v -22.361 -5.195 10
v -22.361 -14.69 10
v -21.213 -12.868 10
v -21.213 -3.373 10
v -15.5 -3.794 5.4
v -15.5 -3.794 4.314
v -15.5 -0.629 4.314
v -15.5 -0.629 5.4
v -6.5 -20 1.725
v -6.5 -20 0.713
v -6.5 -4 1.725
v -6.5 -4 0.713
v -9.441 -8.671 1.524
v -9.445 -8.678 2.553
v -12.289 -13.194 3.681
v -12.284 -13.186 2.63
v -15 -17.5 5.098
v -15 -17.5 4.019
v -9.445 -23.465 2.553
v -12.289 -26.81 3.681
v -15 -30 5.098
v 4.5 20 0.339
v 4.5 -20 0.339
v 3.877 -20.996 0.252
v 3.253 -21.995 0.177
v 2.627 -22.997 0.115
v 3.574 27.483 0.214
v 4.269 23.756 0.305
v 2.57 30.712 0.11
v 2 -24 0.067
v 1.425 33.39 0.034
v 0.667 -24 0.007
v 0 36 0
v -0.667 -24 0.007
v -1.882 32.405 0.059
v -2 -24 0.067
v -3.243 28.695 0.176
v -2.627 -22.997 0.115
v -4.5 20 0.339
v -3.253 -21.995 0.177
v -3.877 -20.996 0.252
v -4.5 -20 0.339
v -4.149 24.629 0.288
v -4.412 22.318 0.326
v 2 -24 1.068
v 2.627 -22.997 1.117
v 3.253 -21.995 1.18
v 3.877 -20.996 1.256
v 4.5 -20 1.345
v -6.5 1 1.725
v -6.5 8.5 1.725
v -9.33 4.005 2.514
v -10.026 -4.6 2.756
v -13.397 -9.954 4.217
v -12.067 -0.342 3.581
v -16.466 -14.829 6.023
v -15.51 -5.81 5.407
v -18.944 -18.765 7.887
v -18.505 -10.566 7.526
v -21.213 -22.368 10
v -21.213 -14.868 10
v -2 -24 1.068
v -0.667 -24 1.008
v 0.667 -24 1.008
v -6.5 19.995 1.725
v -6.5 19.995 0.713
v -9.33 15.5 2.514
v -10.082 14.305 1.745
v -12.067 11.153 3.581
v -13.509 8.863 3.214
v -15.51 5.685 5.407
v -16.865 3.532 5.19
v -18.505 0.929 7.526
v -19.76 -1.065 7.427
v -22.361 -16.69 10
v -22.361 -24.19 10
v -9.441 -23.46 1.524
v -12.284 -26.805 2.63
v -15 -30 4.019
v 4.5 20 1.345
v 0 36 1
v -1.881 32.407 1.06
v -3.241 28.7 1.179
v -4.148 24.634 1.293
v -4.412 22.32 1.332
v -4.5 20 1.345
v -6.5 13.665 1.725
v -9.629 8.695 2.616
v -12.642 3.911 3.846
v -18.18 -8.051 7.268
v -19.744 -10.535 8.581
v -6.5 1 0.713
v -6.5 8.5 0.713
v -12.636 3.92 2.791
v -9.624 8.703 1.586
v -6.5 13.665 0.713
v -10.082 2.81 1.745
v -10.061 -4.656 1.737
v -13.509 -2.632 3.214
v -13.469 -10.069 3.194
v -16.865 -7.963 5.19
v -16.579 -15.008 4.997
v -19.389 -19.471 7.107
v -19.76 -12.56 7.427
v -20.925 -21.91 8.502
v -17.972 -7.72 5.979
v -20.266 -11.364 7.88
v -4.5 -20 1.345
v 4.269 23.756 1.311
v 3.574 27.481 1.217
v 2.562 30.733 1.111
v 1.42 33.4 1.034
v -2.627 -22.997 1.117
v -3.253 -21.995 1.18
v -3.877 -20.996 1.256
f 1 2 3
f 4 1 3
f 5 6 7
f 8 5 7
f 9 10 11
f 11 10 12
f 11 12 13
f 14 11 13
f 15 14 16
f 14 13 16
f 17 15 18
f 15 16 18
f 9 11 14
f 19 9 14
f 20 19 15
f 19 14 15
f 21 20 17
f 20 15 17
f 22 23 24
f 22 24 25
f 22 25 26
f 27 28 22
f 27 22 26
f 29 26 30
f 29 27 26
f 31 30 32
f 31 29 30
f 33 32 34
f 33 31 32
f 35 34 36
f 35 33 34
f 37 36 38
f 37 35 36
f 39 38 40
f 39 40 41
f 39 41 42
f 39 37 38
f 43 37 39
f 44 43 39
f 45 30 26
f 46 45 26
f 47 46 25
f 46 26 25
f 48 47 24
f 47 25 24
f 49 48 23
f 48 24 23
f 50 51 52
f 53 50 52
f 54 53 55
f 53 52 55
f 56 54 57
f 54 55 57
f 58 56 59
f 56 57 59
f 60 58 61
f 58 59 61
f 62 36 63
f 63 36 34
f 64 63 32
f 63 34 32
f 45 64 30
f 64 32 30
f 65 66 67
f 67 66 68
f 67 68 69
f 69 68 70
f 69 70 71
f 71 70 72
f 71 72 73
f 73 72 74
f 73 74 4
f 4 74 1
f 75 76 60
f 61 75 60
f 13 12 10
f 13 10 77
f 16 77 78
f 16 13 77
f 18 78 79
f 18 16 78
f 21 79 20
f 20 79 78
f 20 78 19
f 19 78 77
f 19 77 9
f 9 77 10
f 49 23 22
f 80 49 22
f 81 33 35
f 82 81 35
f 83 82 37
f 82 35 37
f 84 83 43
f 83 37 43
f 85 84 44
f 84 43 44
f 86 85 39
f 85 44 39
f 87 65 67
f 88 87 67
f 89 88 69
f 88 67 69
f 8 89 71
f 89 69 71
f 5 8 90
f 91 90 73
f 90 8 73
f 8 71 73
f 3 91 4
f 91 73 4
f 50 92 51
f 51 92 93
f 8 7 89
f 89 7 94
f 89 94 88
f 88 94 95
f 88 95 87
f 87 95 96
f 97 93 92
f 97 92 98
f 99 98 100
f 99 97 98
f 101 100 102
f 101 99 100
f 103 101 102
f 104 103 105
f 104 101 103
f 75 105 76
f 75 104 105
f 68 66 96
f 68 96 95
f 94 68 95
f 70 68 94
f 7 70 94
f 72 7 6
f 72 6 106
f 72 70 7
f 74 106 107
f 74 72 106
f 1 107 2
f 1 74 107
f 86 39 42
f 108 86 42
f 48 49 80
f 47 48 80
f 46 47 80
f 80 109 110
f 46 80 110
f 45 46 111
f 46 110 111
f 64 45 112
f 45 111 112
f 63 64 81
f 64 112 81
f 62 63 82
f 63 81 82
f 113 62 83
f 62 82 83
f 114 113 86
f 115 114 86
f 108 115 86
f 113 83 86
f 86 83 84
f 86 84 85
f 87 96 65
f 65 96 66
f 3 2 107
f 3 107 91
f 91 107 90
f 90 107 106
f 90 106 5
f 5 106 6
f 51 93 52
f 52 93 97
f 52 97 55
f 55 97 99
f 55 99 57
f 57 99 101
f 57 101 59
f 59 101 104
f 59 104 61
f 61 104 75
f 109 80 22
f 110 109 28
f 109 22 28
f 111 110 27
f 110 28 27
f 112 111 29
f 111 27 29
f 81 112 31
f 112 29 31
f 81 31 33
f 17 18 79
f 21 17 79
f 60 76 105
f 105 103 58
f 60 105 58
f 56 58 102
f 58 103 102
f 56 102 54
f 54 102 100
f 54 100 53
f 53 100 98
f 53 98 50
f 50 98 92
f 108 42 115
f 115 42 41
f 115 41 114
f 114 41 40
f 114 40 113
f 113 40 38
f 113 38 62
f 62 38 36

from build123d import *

# Parameters (mm, degrees)
PAD_DEPTH       = 10
SKETCH005_R     = 39.820196
SKETCH005_R_2   = 30
POCKET_DEPTH    = 60.001
SKETCH006_R     = 29.5
POCKET001_DEPTH = 60.001
PAD001_DEPTH    = 10
SKETCH007_R     = 41.392108
SKETCH007_R_2   = 30
POCKET002_DEPTH = 26.001
SKETCH008_R     = 29.5
POCKET003_DEPTH = 26.001
PAD002_DEPTH    = 10
SKETCH009_R     = 40.247183
SKETCH009_R_2   = 30
POCKET004_DEPTH = 34.501
SKETCH010_R     = 29.5
POCKET005_DEPTH = 32.691491
PAD003_DEPTH    = 10
SKETCH011_R     = 39.292354
SKETCH011_R_2   = 30
POCKET006_DEPTH = 36.496
SKETCH012_R     = 29.5
POCKET007_DEPTH = 34.686491


with BuildPart() as main_body:
    # Sketch → Pad (new body)
    with BuildSketch(Plane.XY):
        with BuildLine():
            Line((-4.5, 20), (-4.5, -20))
            Line((-4.5, -20), (-2, -24))
            Line((-2, -24), (2, -24))
            Line((2, -24), (4.5, -20))
            Line((4.5, -20), (4.5, 20))
            ThreePointArc((4.5, 20), (3.353591, 28.310385), (0, 36))
            ThreePointArc((0, 36), (-3.353591, 28.310385), (-4.5, 20))
        make_face()
    extrude(amount=PAD_DEPTH)

    # Sketch005 (on DatumPlane) → Pocket (cut, through all)
    with BuildSketch(Plane(origin=(0, 36, 0), x_dir=(-1, 0, 0), z_dir=(0, 1, 0))):
        with Locations((0, 30)):
            Circle(SKETCH005_R)
        with Locations((0, 30)):
            Circle(SKETCH005_R_2, mode=Mode.SUBTRACT)
    extrude(amount=-POCKET_DEPTH, mode=Mode.SUBTRACT)

    # Sketch006 (on DatumPlane) → Pocket001 (cut, through all)
    with BuildSketch(Plane(origin=(0, 36, 0), x_dir=(-1, 0, 0), z_dir=(0, 1, 0))):
        with Locations((0, 30.5)):
            Circle(SKETCH006_R)
    extrude(amount=-POCKET001_DEPTH, mode=Mode.SUBTRACT)


with BuildPart() as body004:
    # Sketch001 → Pad001 (new body)
    with BuildSketch(Plane.XY):
        Polygon((6.5, -20), (6.5, -4), (15, -17.5), (15, -30), align=None)
    extrude(amount=PAD001_DEPTH)

    # Sketch007 (on DatumPlane) → Pocket002 (cut, through all)
    with BuildSketch(Plane(origin=(6.5, -4, 0), x_dir=(1, 0, 0), z_dir=(0, -1, 0))):
        with Locations((-6.5, 30)):
            Circle(SKETCH007_R)
        with Locations((-6.5, 30)):
            Circle(SKETCH007_R_2, mode=Mode.SUBTRACT)
    extrude(amount=POCKET002_DEPTH, mode=Mode.SUBTRACT)

    # Sketch008 (on DatumPlane) → Pocket003 (cut, through all)
    with BuildSketch(Plane(origin=(6.5, -4, 0), x_dir=(1, 0, 0), z_dir=(0, -1, 0))):
        with Locations((-6.5, 30.5)):
            Circle(SKETCH008_R)
    extrude(amount=POCKET003_DEPTH, mode=Mode.SUBTRACT)


with BuildPart() as lower_left_wing:
    # Part__Mirroring: instance of Body004
    add(body004.part.mirror(Plane(origin=(0, 0, 0), x_dir=(0, -1, 0), z_dir=(1, 0, 0))))


with BuildPart() as body005:
    # Sketch002 → Pad002 (new body)
    with BuildSketch(Plane.XY):
        Polygon((6.5, 1), (6.5, 8.5), (23.5, -18.5), (23.5, -26), align=None)
    extrude(amount=PAD002_DEPTH)

    # Sketch009 (on DatumPlane) → Pocket004 (cut, through all)
    with BuildSketch(Plane(origin=(6.5, 8.5, 0), x_dir=(1, 0, 0), z_dir=(0, -1, 0))):
        with Locations((-6.5, 30)):
            Circle(SKETCH009_R)
        with Locations((-6.5, 30)):
            Circle(SKETCH009_R_2, mode=Mode.SUBTRACT)
    extrude(amount=POCKET004_DEPTH, mode=Mode.SUBTRACT)

    # Sketch010 (on DatumPlane) → Pocket005 (cut, through all)
    with BuildSketch(Plane(origin=(6.5, 8.5, 0), x_dir=(1, 0, 0), z_dir=(0, -1, 0))):
        with Locations((-6.5, 30.5)):
            Circle(SKETCH010_R)
    extrude(amount=POCKET005_DEPTH, mode=Mode.SUBTRACT)


with BuildPart() as mid_left_wing:
    # Part__Mirroring001: instance of Body005
    add(body005.part.mirror(Plane(origin=(0, 0, 0), x_dir=(0, -1, 0), z_dir=(1, 0, 0))))


with BuildPart() as body006:
    # Sketch003 → Pad003 (new body)
    with BuildSketch(Plane.XY):
        Polygon((6.5, 13.665), (6.5, 19.995), (23.5, -7.005), (23.5, -16.5), (15.5, -3.794118), (15.5, -0.629118), align=None)
    extrude(amount=PAD003_DEPTH)

    # Sketch011 (on DatumPlane) → Pocket006 (cut, through all)
    with BuildSketch(Plane(origin=(6.5, 19.995, 0), x_dir=(1, 0, 0), z_dir=(0, -1, 0))):
        with Locations((-6.5, 30)):
            Circle(SKETCH011_R)
        with Locations((-6.5, 30)):
            Circle(SKETCH011_R_2, mode=Mode.SUBTRACT)
    extrude(amount=POCKET006_DEPTH, mode=Mode.SUBTRACT)

    # Sketch012 (on DatumPlane) → Pocket007 (cut, through all)
    with BuildSketch(Plane(origin=(6.5, 19.995, 0), x_dir=(1, 0, 0), z_dir=(0, -1, 0))):
        with Locations((-6.5, 30.5)):
            Circle(SKETCH012_R)
    extrude(amount=POCKET007_DEPTH, mode=Mode.SUBTRACT)


with BuildPart() as upper_left_wing:
    # Part__Mirroring002: instance of Body006
    add(body006.part.mirror(Plane(origin=(0, 0, 0), x_dir=(0, -1, 0), z_dir=(1, 0, 0))))


solid = Compound([main_body.part, lower_left_wing.part, mid_left_wing.part, upper_left_wing.part])
